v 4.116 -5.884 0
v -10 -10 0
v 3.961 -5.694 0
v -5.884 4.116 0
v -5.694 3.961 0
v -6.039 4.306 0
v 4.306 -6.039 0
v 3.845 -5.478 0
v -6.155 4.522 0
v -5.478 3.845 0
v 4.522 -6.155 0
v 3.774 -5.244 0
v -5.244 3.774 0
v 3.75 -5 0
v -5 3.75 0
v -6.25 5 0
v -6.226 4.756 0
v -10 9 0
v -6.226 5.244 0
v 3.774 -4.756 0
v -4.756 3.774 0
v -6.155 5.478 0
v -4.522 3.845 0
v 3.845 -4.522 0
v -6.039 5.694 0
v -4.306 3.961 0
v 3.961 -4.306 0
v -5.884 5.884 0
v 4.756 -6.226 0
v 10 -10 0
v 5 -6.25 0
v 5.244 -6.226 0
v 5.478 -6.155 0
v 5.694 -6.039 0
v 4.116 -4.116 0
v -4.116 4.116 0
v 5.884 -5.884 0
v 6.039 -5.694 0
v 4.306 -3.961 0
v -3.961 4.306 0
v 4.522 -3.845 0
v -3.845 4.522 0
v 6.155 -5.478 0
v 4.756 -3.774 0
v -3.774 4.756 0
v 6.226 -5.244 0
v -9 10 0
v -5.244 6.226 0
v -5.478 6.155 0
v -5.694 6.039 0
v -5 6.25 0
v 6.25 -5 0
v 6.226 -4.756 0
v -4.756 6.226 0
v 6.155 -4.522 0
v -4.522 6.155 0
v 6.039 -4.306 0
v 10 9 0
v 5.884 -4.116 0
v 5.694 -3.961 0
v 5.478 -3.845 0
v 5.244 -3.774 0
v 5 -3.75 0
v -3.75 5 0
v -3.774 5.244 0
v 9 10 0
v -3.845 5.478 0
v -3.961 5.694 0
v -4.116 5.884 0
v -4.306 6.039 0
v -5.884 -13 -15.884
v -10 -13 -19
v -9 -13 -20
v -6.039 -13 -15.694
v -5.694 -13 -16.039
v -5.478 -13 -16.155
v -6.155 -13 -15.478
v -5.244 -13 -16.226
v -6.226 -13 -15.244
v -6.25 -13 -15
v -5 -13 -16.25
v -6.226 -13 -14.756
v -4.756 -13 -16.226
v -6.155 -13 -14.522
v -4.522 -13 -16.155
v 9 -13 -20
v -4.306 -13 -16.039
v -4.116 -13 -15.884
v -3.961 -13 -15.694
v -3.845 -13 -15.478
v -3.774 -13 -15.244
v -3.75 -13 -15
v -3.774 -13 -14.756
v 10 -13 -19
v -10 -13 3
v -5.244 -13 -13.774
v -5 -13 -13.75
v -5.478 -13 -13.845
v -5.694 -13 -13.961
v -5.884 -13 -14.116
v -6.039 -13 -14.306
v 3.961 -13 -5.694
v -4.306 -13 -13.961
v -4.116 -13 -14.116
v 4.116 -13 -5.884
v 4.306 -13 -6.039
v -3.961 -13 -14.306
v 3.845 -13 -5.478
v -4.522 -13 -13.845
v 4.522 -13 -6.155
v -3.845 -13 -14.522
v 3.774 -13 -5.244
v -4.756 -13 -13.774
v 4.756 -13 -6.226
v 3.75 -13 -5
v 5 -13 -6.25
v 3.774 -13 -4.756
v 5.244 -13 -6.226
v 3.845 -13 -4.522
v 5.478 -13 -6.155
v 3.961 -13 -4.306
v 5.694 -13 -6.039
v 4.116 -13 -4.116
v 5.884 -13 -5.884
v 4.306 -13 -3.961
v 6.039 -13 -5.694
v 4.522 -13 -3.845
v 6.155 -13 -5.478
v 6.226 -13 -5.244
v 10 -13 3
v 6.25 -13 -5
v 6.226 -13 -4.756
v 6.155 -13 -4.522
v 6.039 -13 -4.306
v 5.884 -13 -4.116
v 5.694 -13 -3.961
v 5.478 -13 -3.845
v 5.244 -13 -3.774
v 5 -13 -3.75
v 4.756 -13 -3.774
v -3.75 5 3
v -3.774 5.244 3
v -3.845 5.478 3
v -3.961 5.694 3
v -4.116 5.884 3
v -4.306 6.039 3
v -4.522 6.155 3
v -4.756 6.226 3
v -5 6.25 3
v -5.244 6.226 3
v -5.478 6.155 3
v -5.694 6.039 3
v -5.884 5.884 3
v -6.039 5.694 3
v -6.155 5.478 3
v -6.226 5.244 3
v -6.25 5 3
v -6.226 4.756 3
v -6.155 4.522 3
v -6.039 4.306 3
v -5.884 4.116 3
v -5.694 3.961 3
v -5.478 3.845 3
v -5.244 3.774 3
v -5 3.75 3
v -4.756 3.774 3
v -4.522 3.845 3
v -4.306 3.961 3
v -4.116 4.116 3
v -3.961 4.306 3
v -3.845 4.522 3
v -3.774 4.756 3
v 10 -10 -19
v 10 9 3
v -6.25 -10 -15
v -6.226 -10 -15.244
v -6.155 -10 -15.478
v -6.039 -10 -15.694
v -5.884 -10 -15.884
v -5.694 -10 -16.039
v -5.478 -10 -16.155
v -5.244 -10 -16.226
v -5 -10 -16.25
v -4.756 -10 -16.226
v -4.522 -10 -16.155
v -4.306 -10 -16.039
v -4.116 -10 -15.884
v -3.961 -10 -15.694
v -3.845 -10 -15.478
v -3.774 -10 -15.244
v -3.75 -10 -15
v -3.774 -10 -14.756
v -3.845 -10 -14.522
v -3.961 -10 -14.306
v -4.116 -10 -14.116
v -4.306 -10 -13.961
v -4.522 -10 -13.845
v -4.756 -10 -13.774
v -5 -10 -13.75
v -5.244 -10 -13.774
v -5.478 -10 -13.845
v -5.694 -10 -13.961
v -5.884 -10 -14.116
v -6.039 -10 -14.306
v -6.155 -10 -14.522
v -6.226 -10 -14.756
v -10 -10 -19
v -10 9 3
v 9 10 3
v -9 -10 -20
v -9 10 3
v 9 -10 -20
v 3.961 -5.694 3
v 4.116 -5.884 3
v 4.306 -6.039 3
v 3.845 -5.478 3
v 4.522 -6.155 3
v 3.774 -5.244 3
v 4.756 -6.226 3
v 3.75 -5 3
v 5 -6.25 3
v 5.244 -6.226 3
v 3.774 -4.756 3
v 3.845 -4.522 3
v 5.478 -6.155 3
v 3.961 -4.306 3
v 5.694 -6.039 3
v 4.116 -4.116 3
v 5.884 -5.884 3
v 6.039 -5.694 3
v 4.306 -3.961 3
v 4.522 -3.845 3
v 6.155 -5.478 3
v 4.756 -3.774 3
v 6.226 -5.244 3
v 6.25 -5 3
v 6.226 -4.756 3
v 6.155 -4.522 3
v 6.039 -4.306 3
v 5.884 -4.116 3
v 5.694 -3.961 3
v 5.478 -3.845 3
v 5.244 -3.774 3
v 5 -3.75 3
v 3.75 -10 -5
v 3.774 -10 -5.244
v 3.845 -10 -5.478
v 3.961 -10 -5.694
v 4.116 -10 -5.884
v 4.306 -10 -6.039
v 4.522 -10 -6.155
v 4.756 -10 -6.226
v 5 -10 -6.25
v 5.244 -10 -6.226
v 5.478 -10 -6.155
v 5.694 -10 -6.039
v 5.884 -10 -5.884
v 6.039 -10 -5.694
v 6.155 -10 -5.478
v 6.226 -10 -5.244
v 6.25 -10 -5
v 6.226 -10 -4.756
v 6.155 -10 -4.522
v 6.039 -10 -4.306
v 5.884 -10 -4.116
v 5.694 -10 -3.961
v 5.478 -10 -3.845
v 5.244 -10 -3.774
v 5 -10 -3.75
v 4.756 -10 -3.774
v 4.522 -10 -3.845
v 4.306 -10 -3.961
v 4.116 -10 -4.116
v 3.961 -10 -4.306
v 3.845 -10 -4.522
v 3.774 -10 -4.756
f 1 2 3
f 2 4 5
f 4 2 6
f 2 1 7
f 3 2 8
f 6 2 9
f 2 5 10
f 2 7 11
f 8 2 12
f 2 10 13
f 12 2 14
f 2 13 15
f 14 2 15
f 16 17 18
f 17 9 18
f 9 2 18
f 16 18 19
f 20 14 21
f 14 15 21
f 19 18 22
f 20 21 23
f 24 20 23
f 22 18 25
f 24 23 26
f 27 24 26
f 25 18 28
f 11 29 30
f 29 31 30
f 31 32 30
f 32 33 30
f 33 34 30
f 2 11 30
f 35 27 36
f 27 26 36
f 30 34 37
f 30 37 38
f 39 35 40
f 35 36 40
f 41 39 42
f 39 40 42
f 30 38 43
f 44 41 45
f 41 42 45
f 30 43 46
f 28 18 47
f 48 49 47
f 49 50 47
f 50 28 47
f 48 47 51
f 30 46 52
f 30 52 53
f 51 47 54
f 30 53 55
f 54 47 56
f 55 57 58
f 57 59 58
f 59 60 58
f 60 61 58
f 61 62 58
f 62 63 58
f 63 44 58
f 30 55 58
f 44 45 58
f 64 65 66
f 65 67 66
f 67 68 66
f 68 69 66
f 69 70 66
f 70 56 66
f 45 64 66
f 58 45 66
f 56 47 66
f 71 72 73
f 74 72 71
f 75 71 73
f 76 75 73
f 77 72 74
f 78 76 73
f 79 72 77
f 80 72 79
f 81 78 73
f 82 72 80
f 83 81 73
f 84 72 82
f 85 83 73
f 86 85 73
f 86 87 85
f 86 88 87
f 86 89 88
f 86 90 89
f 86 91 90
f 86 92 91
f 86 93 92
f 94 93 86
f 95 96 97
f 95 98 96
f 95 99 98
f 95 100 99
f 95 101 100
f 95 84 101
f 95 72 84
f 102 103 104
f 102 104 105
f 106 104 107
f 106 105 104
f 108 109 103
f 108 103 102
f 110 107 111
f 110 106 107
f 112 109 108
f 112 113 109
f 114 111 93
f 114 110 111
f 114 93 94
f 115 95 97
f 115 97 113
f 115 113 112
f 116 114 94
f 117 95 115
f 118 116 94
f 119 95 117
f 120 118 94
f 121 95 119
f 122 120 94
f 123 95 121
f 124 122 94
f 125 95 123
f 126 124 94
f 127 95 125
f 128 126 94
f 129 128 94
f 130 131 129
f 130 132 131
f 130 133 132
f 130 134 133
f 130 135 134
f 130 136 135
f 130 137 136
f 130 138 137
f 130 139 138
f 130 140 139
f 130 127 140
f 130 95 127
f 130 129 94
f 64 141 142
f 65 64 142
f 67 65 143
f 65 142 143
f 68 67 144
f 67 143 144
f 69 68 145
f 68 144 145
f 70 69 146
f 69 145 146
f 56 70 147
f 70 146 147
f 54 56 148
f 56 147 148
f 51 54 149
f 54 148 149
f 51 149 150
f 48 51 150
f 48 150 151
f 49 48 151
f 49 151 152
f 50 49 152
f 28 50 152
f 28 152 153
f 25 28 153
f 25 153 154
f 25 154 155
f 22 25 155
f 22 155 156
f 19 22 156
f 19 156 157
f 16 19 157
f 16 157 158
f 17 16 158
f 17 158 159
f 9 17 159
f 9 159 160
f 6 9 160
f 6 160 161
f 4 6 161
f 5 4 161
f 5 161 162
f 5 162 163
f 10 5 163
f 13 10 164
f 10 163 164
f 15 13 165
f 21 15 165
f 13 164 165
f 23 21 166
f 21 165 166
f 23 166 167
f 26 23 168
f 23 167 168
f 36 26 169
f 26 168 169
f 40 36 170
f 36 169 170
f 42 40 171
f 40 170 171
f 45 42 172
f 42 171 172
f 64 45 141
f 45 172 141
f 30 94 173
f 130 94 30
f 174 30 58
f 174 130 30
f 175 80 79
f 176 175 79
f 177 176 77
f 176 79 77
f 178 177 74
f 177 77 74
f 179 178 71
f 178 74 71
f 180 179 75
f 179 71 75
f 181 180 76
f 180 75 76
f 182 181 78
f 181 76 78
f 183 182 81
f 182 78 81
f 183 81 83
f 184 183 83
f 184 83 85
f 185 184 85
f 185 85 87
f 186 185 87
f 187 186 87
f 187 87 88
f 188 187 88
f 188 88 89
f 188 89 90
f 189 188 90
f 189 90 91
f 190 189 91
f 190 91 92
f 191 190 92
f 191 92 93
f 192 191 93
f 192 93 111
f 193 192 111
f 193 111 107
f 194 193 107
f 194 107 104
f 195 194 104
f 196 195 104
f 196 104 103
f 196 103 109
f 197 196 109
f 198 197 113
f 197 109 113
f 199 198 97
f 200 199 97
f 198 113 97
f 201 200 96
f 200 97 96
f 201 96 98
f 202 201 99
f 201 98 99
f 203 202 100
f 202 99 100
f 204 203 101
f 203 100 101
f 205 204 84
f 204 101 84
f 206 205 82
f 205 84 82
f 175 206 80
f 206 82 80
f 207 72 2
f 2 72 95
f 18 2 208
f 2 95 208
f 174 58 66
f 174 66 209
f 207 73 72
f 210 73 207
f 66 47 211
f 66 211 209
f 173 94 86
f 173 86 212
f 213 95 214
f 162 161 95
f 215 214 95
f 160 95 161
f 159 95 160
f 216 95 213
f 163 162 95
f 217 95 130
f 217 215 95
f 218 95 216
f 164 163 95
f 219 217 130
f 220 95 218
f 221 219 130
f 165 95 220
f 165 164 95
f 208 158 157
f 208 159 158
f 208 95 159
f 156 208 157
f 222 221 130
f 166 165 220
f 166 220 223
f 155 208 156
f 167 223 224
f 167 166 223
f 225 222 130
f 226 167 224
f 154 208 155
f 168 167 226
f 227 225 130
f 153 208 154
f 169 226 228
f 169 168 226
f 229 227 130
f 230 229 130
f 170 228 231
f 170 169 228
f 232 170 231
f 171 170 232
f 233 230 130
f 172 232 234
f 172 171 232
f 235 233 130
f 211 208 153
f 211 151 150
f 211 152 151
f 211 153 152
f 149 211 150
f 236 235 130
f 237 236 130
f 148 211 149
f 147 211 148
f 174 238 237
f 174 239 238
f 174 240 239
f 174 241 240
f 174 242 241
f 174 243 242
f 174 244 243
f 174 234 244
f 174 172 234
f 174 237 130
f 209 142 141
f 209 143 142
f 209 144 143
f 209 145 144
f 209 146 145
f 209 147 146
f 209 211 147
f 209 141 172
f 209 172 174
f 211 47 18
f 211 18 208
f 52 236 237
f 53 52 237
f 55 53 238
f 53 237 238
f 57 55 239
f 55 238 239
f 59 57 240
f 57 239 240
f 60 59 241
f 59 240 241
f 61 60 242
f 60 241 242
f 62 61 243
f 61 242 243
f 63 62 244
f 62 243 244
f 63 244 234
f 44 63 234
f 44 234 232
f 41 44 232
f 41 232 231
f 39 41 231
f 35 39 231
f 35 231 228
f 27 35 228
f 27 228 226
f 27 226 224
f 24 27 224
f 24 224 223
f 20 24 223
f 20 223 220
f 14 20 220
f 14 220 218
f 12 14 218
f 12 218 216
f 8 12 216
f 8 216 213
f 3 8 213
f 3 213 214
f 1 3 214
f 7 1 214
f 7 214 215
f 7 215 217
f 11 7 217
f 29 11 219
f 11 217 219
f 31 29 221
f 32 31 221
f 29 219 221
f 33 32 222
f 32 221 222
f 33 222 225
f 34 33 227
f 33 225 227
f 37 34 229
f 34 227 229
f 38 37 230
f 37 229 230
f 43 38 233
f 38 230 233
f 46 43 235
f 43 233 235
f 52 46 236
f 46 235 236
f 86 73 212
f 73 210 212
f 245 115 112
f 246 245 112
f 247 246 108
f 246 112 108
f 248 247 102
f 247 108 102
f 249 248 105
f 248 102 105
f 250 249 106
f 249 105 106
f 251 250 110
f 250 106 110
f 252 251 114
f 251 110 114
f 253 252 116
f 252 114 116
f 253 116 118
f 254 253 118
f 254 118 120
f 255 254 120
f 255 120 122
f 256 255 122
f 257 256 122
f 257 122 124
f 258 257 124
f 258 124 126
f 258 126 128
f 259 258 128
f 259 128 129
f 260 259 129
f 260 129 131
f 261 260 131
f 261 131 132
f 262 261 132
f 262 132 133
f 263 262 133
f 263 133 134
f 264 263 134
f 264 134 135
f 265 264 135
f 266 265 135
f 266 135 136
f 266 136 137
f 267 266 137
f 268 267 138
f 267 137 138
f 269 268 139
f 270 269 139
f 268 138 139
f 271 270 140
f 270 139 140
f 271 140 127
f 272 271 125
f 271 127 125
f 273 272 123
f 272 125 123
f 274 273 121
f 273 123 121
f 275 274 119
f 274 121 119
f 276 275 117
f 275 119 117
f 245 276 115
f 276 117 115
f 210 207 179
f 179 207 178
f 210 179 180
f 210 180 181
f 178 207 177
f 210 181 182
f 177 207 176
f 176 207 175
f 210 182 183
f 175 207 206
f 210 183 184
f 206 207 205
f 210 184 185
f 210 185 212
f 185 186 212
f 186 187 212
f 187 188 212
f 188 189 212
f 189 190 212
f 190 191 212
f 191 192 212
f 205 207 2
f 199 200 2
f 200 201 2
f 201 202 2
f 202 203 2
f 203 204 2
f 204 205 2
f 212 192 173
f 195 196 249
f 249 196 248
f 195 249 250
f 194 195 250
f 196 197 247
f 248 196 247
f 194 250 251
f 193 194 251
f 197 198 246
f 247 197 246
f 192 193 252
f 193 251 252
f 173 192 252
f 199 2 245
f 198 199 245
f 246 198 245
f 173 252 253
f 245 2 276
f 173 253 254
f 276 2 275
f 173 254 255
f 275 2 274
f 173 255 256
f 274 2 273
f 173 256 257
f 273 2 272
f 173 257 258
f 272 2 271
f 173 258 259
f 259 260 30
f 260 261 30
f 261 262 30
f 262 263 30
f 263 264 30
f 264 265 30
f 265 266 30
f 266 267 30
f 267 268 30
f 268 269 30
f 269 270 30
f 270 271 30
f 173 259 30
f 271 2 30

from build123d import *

# Parameters (mm, degrees)
SKETCH_1_W             = 20
SKETCH_1_H             = 20
EXTRUDE_1_DEPTH        = 3
SKETCH_2_W             = 20
SKETCH_2_H             = 3
EXTRUDE_2_DEPTH        = 23
HOLE_WIZARD_M3_1_D     = 2.5
HOLE_WIZARD_M3_1_DEPTH = 7.5
HOLE_WIZARD_M3_1_TIP   = 0.751075774
HOLE_WIZARD_M3_2_D     = 2.5
HOLE_WIZARD_M3_2_DEPTH = 7.5
HOLE_WIZARD_M3_2_TIP   = 0.751075774
CHAMFER_1_SIZE         = 1


with BuildPart() as part:
    # 草图1 → 凸台-拉伸1 (new body)
    with BuildSketch(Plane.XY):
        Rectangle(SKETCH_1_W, SKETCH_1_H)
    extrude(amount=EXTRUDE_1_DEPTH)

    # 草图2 → 凸台-拉伸2 (add)
    with BuildSketch(Plane.XY.offset(3)):
        with Locations((0, -11.5)):
            Rectangle(SKETCH_2_W, SKETCH_2_H)
    extrude(amount=-EXTRUDE_2_DEPTH)

    # M3 螺纹孔1
    with Locations(Plane(origin=(0, 0, 0), x_dir=(-1, 0, 0), z_dir=(0, 0, -1))):
        with Locations((5, 5), (-5, -5)):
            Hole(HOLE_WIZARD_M3_1_D / 2, depth=HOLE_WIZARD_M3_1_DEPTH)
            with Locations((0, 0, -(HOLE_WIZARD_M3_1_DEPTH + HOLE_WIZARD_M3_1_TIP / 2))):  # 118° drill point
                Cone(0, HOLE_WIZARD_M3_1_D / 2, HOLE_WIZARD_M3_1_TIP, mode=Mode.SUBTRACT)

    # M3 螺纹孔2
    with Locations(Plane(origin=(0, -10, 0), x_dir=(1, 0, 0), z_dir=(0, 1, 0))):
        with Locations((-5, 15), (5, 5)):
            Hole(HOLE_WIZARD_M3_2_D / 2, depth=HOLE_WIZARD_M3_2_DEPTH)
            with Locations((0, 0, -(HOLE_WIZARD_M3_2_DEPTH + HOLE_WIZARD_M3_2_TIP / 2))):  # 118° drill point
                Cone(0, HOLE_WIZARD_M3_2_D / 2, HOLE_WIZARD_M3_2_TIP, mode=Mode.SUBTRACT)

    # 倒角1
    chamfer_1_edges = [part.edges().sort_by_distance(p)[0] for p in [
        (-10, -11.5, -20),
        (10, -11.5, -20),
        (-10, 10, 1.5),
        (10, 10, 1.5),
    ]]
    chamfer(chamfer_1_edges, length=CHAMFER_1_SIZE)


solid = part.part
